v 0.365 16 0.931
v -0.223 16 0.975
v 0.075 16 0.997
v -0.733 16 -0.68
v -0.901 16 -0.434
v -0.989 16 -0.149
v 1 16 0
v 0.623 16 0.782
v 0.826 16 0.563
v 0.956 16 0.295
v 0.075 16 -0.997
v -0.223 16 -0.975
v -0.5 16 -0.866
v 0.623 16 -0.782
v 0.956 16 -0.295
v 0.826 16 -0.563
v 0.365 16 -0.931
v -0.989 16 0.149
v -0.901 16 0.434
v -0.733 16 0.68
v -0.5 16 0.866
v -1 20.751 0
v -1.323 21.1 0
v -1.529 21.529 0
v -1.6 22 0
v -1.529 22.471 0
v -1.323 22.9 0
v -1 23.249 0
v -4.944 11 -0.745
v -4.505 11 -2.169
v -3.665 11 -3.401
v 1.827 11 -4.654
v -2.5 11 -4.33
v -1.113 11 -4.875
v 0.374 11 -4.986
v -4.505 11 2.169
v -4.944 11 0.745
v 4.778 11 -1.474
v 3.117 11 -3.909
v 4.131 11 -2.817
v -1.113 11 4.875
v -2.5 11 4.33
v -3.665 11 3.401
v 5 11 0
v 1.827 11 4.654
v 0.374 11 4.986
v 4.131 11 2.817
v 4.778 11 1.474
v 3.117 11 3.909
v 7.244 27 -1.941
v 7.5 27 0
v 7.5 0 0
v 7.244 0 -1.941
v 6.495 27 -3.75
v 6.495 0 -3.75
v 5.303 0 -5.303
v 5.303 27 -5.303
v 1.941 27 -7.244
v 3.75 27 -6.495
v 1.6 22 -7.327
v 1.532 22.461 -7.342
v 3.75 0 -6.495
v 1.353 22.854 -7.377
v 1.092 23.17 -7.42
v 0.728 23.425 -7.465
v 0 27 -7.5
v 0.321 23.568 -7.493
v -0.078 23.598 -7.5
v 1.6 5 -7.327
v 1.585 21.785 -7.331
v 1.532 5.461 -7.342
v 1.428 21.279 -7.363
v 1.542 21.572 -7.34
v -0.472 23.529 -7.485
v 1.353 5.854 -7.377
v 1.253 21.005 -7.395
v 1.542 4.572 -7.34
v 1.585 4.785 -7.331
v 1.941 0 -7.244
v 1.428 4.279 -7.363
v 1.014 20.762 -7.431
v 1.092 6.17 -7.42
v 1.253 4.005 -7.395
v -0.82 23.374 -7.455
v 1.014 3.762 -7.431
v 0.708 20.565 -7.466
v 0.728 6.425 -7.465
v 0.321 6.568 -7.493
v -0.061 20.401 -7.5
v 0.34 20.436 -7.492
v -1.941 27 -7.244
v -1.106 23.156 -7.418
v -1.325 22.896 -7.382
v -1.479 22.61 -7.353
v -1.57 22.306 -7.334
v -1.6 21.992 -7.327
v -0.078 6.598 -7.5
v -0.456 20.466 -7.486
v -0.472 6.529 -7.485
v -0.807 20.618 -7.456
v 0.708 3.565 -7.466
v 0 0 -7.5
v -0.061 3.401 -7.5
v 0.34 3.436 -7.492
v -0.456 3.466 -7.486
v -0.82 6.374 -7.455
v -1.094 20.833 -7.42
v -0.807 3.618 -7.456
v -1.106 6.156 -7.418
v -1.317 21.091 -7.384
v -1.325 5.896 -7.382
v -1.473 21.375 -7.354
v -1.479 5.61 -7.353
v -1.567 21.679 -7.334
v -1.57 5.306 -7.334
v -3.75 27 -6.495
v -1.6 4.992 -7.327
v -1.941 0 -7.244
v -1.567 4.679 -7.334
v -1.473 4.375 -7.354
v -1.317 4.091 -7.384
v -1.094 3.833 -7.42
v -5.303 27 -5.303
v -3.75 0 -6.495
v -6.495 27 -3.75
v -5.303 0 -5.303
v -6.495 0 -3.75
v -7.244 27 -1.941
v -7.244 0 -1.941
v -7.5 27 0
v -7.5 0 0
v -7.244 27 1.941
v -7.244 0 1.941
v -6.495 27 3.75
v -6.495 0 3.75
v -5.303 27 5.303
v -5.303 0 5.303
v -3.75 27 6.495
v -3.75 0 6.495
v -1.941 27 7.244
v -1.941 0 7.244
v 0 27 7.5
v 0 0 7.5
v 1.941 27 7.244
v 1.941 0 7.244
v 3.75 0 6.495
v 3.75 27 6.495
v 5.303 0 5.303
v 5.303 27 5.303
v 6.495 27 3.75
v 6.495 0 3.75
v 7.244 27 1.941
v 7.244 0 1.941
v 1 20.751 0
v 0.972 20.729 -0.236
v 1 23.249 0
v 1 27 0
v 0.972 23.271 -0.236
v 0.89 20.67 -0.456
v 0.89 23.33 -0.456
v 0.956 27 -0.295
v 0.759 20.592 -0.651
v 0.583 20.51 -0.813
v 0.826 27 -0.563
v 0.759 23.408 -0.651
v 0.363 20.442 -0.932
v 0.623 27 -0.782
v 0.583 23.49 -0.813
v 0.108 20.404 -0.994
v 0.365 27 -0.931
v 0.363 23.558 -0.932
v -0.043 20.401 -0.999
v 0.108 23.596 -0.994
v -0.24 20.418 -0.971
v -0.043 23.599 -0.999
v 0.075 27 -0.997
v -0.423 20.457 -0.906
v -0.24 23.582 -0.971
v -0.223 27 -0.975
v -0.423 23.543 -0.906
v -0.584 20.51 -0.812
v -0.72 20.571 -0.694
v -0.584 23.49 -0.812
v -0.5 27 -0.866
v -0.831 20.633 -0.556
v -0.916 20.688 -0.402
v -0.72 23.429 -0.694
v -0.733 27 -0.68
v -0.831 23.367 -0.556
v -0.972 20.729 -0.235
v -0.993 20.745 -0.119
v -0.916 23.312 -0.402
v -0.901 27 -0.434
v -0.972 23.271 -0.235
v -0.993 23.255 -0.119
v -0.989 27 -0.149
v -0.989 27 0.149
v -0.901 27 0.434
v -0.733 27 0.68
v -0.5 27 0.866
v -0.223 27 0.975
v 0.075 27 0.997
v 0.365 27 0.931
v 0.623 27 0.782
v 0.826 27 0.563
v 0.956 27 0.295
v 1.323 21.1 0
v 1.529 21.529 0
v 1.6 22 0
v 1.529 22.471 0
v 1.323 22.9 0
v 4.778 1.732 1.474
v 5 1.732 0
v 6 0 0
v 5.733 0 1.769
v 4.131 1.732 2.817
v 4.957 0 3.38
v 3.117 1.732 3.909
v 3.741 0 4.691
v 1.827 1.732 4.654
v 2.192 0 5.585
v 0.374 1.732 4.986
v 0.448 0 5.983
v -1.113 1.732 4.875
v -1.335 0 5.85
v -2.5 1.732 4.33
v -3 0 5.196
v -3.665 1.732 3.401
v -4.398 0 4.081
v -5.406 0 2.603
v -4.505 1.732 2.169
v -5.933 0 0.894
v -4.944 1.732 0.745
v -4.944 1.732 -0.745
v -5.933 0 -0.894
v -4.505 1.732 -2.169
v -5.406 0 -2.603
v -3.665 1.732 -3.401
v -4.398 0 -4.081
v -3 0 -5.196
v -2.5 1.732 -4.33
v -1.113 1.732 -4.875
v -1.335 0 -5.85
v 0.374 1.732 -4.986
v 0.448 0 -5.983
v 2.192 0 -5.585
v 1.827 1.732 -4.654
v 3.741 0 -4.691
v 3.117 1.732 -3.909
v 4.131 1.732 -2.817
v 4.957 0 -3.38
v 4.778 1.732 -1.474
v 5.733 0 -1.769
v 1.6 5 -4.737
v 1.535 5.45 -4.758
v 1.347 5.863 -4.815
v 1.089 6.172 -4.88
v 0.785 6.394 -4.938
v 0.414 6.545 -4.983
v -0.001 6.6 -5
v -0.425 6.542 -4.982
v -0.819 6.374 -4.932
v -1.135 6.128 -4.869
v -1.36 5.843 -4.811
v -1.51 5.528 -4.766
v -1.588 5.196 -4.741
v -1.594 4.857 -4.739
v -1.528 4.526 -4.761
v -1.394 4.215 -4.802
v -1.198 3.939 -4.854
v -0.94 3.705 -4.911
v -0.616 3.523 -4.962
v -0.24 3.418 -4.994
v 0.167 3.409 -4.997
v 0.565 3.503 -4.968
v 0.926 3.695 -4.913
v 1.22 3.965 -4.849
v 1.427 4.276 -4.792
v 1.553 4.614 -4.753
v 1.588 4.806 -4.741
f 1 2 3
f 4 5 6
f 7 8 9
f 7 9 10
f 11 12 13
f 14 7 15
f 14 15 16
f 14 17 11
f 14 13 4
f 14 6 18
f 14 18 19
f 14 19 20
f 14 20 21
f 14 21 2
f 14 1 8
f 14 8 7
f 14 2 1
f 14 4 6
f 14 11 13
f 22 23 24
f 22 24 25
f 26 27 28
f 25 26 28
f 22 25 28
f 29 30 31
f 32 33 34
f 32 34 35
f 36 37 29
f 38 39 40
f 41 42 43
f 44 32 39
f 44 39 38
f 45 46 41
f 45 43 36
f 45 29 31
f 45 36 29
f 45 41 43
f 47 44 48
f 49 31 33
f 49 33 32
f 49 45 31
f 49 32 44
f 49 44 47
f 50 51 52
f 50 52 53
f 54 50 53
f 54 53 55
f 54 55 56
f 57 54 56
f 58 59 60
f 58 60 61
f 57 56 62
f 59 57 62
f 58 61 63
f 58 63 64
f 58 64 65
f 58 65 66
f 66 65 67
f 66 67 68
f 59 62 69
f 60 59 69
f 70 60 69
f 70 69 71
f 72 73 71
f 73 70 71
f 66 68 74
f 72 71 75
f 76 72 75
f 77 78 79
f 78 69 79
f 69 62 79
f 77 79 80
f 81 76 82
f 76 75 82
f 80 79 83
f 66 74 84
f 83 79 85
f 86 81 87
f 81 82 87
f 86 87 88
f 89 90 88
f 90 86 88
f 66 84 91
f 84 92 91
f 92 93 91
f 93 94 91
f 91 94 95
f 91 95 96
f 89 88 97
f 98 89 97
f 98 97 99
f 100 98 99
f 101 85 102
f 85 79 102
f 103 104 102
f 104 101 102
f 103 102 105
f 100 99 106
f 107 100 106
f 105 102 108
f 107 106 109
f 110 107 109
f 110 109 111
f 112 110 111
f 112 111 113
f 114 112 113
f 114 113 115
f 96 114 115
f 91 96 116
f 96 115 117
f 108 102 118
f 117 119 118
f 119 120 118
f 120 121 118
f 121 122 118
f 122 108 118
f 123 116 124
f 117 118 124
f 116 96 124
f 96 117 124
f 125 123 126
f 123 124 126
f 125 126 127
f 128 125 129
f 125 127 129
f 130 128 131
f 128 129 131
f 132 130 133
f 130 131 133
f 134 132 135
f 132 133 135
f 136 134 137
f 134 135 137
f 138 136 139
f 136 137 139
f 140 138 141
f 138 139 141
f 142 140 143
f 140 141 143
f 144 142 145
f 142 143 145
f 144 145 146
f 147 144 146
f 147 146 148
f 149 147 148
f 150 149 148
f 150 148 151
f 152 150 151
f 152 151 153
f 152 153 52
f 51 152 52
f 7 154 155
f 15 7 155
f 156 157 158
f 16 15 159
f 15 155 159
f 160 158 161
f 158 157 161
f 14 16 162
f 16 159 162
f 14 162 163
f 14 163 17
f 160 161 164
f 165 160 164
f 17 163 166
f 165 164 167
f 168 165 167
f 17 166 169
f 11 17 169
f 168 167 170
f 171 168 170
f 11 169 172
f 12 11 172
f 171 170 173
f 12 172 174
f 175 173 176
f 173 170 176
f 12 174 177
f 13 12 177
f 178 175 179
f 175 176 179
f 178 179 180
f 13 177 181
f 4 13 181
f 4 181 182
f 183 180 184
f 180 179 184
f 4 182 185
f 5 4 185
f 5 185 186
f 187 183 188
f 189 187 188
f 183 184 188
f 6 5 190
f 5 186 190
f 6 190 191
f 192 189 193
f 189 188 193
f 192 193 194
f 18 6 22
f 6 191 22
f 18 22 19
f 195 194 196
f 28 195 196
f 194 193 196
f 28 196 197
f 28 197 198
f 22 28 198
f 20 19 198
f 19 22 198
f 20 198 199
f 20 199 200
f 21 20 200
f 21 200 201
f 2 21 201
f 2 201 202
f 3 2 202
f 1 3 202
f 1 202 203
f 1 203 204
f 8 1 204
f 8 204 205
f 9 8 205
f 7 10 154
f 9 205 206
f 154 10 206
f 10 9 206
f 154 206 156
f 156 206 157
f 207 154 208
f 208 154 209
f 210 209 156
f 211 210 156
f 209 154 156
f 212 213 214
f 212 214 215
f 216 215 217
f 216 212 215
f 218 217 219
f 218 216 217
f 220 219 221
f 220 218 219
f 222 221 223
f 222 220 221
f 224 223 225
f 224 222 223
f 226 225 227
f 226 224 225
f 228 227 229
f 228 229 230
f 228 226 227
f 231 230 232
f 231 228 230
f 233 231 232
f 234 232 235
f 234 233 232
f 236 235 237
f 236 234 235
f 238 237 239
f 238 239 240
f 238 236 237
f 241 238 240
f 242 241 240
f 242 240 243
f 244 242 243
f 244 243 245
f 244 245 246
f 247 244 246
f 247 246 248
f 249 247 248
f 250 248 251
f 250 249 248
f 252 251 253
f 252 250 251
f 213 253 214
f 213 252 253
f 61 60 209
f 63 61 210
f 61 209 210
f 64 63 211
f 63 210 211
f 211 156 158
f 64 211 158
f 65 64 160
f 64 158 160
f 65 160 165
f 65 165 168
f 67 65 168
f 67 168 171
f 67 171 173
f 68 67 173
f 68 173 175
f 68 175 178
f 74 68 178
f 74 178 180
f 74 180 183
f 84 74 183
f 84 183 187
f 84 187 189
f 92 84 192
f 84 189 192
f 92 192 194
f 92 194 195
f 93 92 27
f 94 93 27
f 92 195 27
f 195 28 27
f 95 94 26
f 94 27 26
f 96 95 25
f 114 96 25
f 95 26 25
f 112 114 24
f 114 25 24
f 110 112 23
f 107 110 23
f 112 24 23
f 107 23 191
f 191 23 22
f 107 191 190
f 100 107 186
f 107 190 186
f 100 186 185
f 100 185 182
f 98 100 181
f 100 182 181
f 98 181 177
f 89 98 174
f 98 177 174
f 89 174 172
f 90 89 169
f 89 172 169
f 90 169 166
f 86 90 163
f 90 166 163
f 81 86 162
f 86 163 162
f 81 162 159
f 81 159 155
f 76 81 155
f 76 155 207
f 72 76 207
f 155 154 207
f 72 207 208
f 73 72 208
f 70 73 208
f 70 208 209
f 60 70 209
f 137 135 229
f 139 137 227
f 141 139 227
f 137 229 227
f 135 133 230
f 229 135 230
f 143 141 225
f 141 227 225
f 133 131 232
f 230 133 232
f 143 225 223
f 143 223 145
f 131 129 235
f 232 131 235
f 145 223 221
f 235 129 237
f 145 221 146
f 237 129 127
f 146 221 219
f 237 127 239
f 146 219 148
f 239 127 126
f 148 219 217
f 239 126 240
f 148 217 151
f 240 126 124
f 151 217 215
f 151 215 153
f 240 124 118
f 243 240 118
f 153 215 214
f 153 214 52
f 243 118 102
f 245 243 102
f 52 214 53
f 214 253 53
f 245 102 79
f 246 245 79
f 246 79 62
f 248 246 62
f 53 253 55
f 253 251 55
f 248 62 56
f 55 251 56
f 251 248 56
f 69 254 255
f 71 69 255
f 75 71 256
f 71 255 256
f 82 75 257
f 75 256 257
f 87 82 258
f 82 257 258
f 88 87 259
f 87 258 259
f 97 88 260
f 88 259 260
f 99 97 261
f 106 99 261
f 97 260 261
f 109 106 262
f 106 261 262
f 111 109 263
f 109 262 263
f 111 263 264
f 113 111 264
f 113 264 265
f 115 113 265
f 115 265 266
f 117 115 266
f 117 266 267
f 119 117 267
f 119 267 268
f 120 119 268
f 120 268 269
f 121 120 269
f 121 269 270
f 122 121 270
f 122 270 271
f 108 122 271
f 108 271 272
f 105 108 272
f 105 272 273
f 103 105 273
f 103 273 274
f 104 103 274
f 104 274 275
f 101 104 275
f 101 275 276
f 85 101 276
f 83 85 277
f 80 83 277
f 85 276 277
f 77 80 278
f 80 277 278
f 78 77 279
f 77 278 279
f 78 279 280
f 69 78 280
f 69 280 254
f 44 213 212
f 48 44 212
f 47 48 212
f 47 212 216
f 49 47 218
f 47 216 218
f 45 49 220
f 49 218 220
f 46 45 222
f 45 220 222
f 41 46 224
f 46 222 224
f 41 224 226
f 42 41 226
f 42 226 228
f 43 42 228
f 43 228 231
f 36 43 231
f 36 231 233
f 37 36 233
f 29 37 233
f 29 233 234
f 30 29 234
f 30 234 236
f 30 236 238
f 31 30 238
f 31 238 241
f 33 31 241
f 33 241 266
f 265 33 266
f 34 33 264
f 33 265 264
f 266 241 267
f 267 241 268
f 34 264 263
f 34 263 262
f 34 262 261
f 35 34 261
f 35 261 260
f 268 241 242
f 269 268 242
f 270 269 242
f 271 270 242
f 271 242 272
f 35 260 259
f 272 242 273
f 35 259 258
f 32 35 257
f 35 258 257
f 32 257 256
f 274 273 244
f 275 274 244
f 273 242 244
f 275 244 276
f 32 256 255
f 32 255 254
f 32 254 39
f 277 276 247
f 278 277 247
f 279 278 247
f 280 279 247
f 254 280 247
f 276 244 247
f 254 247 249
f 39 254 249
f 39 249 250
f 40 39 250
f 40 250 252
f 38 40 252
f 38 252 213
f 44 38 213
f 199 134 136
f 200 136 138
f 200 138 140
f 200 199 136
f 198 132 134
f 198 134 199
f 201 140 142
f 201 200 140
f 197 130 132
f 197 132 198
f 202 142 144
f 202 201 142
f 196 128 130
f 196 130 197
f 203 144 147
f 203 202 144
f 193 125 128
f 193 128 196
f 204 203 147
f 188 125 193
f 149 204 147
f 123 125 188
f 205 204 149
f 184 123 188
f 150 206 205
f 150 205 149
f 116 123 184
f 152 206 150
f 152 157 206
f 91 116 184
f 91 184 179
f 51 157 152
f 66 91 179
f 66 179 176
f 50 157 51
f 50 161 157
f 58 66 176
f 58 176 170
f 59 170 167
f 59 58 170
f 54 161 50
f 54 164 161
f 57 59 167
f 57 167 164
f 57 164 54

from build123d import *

# Parameters (mm, degrees)
SKETCH1_R           = 7.5
BOSS_EXTRUDE1_DEPTH = 27
SKETCH2_R           = 5
CUT_EXTRUDE1_DEPTH  = 11
SKETCH3_R           = 1
CUT_EXTRUDE2_DEPTH  = 11
SKETCH4_R           = 1.6
CUT_EXTRUDE3_DEPTH  = 11
CHAMFER1_SIZE       = 1
CHAMFER1_SIZE2      = 1.732050808


with BuildPart() as part:
    # Sketch1 → Boss-Extrude1 (new body)
    with BuildSketch(Plane(origin=(0, 0, 0), x_dir=(1, 0, 0), z_dir=(0, 1, 0))):
        Circle(SKETCH1_R)
    extrude(amount=BOSS_EXTRUDE1_DEPTH)

    # Sketch2 → Cut-Extrude1 (cut)
    with BuildSketch(Plane.XZ):
        Circle(SKETCH2_R)
    extrude(amount=-CUT_EXTRUDE1_DEPTH, mode=Mode.SUBTRACT)

    # Sketch3 → Cut-Extrude2 (cut)
    with BuildSketch(Plane(origin=(0, 27, 0), x_dir=(1, 0, 0), z_dir=(0, 1, 0))):
        Circle(SKETCH3_R)
    extrude(amount=-CUT_EXTRUDE2_DEPTH, mode=Mode.SUBTRACT)

    # Sketch4 → Cut-Extrude3 (cut)
    with BuildSketch(Plane.XY):
        with Locations((0, 22)):
            Circle(SKETCH4_R)
        with Locations((0, 5)):
            Circle(SKETCH4_R)
    extrude(amount=-CUT_EXTRUDE3_DEPTH, mode=Mode.SUBTRACT)

    # Chamfer1
    chamfer1_edges = [part.edges().sort_by_distance(p)[0] for p in [
        (-5, 0, 0),
    ]]
    chamfer1_side = [part.faces().sort_by_distance(p)[0] for p in [
        (-7.287867966, 0, 0),
    ]]
    chamfer(chamfer1_edges, length=CHAMFER1_SIZE, length2=CHAMFER1_SIZE2, reference=chamfer1_side[0])


solid = part.part
